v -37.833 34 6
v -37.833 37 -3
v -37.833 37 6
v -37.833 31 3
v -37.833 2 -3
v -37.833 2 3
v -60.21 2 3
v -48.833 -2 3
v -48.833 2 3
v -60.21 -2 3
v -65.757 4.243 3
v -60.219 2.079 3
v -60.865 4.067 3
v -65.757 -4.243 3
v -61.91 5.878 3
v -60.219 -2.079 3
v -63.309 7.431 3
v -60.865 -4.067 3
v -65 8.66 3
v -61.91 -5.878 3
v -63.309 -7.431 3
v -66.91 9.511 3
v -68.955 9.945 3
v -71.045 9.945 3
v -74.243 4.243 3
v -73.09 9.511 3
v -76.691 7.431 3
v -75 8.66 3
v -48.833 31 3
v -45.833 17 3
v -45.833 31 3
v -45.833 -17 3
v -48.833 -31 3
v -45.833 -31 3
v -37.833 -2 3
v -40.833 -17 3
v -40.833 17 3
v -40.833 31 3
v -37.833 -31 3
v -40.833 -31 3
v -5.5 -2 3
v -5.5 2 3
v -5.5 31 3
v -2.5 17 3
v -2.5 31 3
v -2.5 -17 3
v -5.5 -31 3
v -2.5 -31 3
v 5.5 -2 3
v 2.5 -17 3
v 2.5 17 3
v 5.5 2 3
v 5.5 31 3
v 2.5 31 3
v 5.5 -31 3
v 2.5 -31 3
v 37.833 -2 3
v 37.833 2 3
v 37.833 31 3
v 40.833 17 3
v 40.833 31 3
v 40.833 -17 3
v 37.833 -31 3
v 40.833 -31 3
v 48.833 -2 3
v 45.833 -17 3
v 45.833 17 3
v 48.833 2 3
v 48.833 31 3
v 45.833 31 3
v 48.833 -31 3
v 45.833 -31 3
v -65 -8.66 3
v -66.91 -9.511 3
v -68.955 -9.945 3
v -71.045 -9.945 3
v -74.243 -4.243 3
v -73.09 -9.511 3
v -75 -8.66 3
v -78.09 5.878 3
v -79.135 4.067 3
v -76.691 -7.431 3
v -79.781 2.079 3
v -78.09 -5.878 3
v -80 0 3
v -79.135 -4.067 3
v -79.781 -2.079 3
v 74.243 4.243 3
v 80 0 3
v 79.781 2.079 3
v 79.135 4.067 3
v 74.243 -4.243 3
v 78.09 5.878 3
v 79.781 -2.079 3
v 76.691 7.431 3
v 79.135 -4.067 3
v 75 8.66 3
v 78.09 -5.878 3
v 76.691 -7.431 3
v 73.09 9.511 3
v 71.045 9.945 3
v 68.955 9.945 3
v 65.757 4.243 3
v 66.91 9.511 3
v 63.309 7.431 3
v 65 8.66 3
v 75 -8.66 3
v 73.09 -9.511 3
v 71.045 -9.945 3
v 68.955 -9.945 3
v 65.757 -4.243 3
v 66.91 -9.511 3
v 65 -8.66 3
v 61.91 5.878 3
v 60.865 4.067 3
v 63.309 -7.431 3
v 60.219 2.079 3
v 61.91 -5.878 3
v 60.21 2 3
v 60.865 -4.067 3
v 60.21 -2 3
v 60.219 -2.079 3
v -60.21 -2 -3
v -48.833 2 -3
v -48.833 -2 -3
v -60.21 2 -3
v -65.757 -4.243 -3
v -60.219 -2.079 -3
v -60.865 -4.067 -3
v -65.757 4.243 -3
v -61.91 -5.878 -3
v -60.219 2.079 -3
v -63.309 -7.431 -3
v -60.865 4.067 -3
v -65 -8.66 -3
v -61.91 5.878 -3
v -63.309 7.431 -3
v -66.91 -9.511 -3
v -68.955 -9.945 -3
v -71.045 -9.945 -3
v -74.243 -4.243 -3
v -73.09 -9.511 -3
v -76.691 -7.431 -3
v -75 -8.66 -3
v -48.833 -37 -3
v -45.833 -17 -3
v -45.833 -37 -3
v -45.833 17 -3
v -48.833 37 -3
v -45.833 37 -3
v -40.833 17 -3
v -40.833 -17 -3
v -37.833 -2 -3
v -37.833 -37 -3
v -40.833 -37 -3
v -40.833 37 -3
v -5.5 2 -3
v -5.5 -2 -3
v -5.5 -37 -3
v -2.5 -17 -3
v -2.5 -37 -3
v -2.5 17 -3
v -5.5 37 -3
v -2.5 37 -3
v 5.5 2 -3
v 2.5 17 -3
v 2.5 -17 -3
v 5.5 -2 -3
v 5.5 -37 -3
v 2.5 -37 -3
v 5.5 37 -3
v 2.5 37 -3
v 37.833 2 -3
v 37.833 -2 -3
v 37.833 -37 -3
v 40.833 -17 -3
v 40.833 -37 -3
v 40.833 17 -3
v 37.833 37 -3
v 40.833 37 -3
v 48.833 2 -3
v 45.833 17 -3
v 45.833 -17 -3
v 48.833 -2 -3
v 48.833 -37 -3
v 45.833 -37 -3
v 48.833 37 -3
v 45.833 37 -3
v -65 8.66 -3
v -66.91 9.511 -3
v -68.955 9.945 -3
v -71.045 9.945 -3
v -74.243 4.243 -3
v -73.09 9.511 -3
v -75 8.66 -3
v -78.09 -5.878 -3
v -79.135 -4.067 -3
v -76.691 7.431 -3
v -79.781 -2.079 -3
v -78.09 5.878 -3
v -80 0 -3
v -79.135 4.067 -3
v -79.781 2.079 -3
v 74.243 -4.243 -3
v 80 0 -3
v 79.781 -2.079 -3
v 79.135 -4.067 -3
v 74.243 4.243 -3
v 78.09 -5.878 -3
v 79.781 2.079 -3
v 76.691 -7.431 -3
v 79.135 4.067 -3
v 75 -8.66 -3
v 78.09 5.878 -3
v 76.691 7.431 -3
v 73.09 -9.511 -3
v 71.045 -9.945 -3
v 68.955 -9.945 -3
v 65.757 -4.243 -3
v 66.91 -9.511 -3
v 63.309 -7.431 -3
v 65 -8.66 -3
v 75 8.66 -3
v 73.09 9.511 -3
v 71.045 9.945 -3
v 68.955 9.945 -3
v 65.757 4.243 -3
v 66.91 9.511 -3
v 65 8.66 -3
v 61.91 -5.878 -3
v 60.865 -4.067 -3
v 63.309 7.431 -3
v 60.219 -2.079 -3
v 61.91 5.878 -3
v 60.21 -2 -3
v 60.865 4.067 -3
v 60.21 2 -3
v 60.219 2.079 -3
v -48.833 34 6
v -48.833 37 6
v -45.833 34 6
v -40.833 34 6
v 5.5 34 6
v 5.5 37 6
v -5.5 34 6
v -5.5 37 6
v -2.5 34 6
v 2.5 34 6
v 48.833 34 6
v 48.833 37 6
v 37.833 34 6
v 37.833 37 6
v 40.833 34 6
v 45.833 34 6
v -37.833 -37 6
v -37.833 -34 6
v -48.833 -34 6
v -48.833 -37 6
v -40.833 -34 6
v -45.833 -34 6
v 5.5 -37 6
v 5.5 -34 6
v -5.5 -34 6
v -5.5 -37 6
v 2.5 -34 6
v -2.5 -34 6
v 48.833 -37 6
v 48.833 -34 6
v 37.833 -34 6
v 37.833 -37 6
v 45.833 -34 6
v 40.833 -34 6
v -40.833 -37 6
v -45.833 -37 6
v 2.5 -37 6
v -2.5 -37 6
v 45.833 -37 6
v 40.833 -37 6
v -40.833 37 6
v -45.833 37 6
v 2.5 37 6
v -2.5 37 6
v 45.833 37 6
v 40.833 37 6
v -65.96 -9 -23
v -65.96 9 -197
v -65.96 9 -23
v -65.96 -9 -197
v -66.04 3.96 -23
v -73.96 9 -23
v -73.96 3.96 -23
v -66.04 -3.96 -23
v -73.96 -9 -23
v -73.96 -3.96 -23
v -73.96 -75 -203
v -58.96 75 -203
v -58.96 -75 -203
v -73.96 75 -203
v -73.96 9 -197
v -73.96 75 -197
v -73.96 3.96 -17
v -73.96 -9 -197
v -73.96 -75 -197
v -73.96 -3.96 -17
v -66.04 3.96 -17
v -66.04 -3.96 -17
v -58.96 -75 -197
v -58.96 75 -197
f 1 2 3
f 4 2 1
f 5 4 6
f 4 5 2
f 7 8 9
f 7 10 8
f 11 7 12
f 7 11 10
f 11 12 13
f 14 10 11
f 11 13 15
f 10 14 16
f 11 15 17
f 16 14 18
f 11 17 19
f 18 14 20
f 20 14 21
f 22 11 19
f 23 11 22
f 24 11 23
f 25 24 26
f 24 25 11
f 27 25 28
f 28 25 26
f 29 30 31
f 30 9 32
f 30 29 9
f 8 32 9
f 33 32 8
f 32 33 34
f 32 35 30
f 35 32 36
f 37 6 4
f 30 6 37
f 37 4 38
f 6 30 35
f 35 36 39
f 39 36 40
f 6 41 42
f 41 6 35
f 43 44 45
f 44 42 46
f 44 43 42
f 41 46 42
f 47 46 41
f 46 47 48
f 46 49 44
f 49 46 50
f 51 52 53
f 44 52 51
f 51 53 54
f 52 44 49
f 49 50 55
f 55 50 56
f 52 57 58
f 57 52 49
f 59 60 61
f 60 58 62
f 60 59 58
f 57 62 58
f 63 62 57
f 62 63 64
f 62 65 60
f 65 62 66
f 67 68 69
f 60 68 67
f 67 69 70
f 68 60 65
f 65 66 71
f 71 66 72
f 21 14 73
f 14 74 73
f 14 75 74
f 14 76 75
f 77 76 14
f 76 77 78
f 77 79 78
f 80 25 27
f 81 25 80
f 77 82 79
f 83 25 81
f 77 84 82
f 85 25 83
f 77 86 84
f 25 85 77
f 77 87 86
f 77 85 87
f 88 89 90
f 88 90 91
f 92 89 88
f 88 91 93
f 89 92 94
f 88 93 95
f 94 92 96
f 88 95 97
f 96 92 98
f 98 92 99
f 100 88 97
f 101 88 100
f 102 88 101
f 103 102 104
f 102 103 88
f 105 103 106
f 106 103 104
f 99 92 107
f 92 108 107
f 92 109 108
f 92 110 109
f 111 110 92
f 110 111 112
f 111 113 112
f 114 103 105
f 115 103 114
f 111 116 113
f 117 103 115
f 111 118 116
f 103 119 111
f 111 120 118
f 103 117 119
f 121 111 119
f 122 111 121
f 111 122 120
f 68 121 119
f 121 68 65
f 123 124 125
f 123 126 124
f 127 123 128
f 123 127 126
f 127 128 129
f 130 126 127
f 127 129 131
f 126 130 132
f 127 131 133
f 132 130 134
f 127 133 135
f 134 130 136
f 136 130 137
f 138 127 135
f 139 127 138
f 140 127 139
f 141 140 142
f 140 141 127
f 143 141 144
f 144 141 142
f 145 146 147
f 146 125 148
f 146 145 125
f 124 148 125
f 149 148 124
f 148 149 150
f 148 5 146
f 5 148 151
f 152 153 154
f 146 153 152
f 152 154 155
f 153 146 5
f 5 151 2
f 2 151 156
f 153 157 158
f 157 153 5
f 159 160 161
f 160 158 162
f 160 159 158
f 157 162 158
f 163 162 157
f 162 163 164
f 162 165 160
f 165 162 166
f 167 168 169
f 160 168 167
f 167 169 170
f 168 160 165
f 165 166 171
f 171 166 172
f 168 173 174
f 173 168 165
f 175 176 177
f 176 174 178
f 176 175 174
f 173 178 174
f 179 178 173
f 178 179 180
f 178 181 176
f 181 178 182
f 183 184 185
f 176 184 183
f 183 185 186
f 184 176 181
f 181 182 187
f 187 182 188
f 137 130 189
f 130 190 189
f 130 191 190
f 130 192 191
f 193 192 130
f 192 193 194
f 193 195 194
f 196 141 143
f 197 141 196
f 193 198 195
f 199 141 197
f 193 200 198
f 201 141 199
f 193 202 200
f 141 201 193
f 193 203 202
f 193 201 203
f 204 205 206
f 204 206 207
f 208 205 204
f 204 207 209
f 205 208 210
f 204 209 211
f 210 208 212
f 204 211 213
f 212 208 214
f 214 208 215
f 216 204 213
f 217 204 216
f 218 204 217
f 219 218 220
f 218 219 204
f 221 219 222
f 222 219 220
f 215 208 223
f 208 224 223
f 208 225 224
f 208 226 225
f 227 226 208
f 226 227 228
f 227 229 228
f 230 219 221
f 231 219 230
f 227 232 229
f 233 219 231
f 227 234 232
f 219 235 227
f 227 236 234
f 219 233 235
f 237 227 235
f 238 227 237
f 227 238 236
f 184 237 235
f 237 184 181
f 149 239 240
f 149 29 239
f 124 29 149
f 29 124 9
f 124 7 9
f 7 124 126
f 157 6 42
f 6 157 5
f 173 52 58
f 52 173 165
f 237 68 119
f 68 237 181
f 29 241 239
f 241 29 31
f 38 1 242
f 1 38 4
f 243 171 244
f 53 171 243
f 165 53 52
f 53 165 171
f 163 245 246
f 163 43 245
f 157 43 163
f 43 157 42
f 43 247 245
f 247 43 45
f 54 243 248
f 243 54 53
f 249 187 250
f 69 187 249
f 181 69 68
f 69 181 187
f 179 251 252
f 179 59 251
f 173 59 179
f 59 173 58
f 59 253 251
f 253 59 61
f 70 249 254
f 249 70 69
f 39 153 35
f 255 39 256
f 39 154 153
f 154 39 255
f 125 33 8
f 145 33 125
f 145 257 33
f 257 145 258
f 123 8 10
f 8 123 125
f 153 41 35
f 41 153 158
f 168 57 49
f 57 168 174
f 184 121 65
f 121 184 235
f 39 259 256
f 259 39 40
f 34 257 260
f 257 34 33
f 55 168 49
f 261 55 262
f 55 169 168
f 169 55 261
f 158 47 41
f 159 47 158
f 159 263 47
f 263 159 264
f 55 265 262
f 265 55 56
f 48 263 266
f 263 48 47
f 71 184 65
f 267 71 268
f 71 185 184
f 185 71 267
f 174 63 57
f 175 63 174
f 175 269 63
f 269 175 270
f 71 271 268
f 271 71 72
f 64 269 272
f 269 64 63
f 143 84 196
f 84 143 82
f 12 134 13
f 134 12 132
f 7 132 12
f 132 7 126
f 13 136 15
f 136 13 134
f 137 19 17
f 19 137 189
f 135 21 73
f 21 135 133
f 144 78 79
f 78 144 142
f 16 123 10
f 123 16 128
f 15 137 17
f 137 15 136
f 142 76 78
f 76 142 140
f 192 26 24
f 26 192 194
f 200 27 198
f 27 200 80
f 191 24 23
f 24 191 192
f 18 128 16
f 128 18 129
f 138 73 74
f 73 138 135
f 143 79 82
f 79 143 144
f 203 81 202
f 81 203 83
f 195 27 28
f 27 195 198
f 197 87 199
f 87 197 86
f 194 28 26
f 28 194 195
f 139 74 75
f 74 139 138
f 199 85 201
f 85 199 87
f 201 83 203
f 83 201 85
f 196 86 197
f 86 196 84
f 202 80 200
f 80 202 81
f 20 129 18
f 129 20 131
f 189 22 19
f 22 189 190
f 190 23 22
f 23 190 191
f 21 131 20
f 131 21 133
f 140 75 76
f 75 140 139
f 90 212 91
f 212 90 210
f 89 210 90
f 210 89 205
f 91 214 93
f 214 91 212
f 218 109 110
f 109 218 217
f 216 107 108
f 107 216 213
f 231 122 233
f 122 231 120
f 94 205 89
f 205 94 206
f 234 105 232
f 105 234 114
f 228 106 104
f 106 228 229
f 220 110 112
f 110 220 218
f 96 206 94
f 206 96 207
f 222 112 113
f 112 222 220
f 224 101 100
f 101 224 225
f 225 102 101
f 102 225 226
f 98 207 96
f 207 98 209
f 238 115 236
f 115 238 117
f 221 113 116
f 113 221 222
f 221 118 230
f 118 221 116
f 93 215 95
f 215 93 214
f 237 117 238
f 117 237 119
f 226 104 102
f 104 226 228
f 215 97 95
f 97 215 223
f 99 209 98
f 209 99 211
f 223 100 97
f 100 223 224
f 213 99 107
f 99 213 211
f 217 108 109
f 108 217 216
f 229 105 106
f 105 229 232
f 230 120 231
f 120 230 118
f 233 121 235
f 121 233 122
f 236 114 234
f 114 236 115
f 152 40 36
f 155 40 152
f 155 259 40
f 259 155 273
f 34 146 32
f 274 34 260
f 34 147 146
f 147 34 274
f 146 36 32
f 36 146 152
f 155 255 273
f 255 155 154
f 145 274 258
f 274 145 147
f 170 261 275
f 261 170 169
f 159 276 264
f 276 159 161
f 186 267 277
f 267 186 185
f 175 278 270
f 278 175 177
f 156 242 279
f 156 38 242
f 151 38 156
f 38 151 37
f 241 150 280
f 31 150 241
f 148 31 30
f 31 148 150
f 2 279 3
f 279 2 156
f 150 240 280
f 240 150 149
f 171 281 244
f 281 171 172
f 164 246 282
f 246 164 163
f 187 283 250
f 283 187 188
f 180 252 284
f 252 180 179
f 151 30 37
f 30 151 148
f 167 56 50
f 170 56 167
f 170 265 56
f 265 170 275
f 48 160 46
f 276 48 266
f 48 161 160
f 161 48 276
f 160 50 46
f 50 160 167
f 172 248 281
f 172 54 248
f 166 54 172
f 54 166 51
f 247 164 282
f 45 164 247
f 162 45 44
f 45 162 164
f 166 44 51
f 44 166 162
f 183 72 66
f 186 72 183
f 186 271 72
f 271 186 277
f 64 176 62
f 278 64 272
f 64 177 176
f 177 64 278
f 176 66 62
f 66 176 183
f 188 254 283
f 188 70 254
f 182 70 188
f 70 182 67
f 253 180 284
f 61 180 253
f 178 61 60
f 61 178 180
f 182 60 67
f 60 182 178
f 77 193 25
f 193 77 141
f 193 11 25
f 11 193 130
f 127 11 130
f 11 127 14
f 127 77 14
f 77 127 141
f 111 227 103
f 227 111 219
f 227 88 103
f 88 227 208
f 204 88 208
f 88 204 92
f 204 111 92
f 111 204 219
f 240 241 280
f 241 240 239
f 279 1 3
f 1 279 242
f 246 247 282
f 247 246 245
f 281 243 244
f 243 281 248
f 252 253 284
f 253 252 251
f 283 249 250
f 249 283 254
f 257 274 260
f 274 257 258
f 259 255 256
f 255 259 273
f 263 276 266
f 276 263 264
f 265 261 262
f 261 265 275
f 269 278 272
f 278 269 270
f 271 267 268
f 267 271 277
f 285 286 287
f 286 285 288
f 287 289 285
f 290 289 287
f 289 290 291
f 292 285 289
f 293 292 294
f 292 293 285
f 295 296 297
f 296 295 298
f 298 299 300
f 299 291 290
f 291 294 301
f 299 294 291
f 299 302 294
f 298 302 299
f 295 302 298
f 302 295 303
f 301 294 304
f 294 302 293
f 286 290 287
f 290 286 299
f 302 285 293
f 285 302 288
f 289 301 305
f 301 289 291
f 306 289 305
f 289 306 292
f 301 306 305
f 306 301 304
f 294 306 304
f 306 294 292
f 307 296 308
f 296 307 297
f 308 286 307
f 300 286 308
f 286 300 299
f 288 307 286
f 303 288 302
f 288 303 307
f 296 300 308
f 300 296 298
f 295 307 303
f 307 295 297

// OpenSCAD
/// ///
/// PIPETTE RACK v1; 2014 02 24 ///
/// by Tom Baden (thingyverse ID: tbaden) ///
/// thomas.baden@uni-tuebingen.de ///
/// tombaden.wordpress.com ///
/// ///

/////////////////////////////////////////////////////////////////////////////////


// CUSTOMIZABLE VARIABLES
1_or_2_sided = 2; // [1,2]
// (will automatically adjust #slots..)
Length = 130; // [50:300]
Height = 180; //[150:220]

Foot_Y = 150; // [100:200]
Foot_X = 15; // [10:30]
// how thick are all the pieces? - multiplyer
Stability = 2; // [1:4]
// (printer precision)
Tolerance = 0.4; // [0.1, 0.2, 0.3, 0.4, 0.5]
///////////////////////////////////////////////////////////////////////////////////////
///////////////////////////////////////////////////////////////////////////////////////
/// CUSTOMIZER CUTOFF: MODIFY ANYTHING BELOW HERE AT YOUR OWN RISK! ///////////////////
module customizer_cutoff(){};//////////////////////////////////////////////////////////
///////////////////////////////////////////////////////////////////////////////////////

sep = 20;

X = Length;
Z = Height;
Y = 18;

Wall_Y = 2*Stability;
Wall_Z = 3*Stability;
Wall_X = 4*Stability;


X_hanger = 11;
Y_hanger = 35;

slot_depth = 20;
slot_width = 5;

Foot_length = Foot_X;
Foot_width = Foot_Y;

R_end = 10;
R_end_inner = 6;
R_end_inner_minus = R_end_inner-Tolerance;
connect_width = sqrt(R_end_inner_minus*R_end_inner_minus*2);


Triangle_top = 30;

n_slots = round(X/50);

2_sided = 1_or_2_sided-1;

/////////////////// TOP (A)

module A(){
	cube([X,Wall_Y,Wall_Z], center = true ); // main beam
	translate([-X/2-R_end/2,0,0]){cylinder(r = R_end, h = Wall_Z, center = true );} // ends
	translate([X/2+R_end/2,0,0]){cylinder(r = R_end, h = Wall_Z, center = true );} // ends
	for (i = [1:n_slots]) { // protrusion 
		translate([-X/2+(i-0.5)*X/n_slots,-Y_hanger/2-Wall_Y/2,0]){cube([X_hanger,Y_hanger,Wall_Z], center = true );} // main
		translate([-X/2+(i-0.5)*X/n_slots,-Y_hanger-Wall_Y/2,Wall_Z/2]){rotate([45,0,0]){ cube([X_hanger,sqrt(2*(Wall_Z*Wall_Z)),sqrt(2*(Wall_Z*Wall_Z))], center = true );}} // slope

		if (2_sided == 1) {	
			translate([-X/2+(i-0.5)*X/n_slots,Y_hanger/2+Wall_Y/2,0]){cube([X_hanger,Y_hanger,Wall_Z], center = true );} 
		translate([-X/2+(i-0.5)*X/n_slots,+Y_hanger+Wall_Y/2,Wall_Z/2]){rotate([45,0,0]){ cube([X_hanger,sqrt(2*(Wall_Z*Wall_Z)),sqrt(2*(Wall_Z*Wall_Z))], center = true );}} // slope
		}
	}	
}
module A_sub(){
	translate([-X/2-R_end/2,0,0]){rotate([0,0,45]){
		cylinder($fn = 4, r = R_end_inner, h = Wall_Z, center = true );}} // end-hole
	translate([X/2+R_end/2,0,0]){rotate([0,0,45]){
		cylinder($fn = 4, r = R_end_inner, h = Wall_Z, center = true );}} // end-hole

	for (i = [1:n_slots]) { // slots
		translate([-X/2+(i-0.5)*X/n_slots,slot_depth/2-Y_hanger-Wall_Y/2,Wall_Z/2]){cube([slot_width,slot_depth,Wall_Z*2], center = true );}
		if (2_sided == 1) {
			translate([-X/2+(i-0.5)*X/n_slots,-slot_depth/2+Y_hanger+Wall_Y/2,Wall_Z/2]){cube([slot_width,slot_depth,Wall_Z*2], center = true);	}}
	}

	translate([0,-Y_hanger-Wall_Y*1.5,Wall_Z/2]){cube([X,Wall_Y*2,Wall_Z*2], center = true );} // Cut ends
	translate([0,Y_hanger+Wall_Y*1.5,Wall_Z/2]){cube([X,Wall_Y*2,Wall_Z*2], center = true );} // Cut ends
	translate([0,0,Wall_Z*1.5]){cube([X,(Y_hanger+Wall_Y)*2,Wall_Z], center = true );} // Cut top
}
difference(){A();A_sub();}

/////////////////// SIDE (B)



module B(){
	translate([-X/2-R_end/2-connect_width/2+Wall_X/2,0,-Z/2-Wall_Z/2-sep]){cube([Wall_X,Y,Z], center = true );} // main beam
	translate([-X/2-R_end/2,0,-sep]){rotate([0,0,45]){
		cylinder($fn = 4, r = R_end_inner_minus, h = Wall_Z, center = true );}} // connect_thingy
	translate([-X/2-R_end/2-connect_width/2+Foot_length/2,0,-Z-sep]){cube([Foot_length,Foot_width,Wall_Z], center = true );} // foot
//	translate([-X/2-R_end/2-connect_width/2+Wall_X/2,0,-sep-connect_width/2]){rotate([0,45,0]){cube([Triangle_top,Wall_Y,Triangle_top], center = true );}} // triangle
}
module B_sub(){

}
difference(){B();B_sub();}
